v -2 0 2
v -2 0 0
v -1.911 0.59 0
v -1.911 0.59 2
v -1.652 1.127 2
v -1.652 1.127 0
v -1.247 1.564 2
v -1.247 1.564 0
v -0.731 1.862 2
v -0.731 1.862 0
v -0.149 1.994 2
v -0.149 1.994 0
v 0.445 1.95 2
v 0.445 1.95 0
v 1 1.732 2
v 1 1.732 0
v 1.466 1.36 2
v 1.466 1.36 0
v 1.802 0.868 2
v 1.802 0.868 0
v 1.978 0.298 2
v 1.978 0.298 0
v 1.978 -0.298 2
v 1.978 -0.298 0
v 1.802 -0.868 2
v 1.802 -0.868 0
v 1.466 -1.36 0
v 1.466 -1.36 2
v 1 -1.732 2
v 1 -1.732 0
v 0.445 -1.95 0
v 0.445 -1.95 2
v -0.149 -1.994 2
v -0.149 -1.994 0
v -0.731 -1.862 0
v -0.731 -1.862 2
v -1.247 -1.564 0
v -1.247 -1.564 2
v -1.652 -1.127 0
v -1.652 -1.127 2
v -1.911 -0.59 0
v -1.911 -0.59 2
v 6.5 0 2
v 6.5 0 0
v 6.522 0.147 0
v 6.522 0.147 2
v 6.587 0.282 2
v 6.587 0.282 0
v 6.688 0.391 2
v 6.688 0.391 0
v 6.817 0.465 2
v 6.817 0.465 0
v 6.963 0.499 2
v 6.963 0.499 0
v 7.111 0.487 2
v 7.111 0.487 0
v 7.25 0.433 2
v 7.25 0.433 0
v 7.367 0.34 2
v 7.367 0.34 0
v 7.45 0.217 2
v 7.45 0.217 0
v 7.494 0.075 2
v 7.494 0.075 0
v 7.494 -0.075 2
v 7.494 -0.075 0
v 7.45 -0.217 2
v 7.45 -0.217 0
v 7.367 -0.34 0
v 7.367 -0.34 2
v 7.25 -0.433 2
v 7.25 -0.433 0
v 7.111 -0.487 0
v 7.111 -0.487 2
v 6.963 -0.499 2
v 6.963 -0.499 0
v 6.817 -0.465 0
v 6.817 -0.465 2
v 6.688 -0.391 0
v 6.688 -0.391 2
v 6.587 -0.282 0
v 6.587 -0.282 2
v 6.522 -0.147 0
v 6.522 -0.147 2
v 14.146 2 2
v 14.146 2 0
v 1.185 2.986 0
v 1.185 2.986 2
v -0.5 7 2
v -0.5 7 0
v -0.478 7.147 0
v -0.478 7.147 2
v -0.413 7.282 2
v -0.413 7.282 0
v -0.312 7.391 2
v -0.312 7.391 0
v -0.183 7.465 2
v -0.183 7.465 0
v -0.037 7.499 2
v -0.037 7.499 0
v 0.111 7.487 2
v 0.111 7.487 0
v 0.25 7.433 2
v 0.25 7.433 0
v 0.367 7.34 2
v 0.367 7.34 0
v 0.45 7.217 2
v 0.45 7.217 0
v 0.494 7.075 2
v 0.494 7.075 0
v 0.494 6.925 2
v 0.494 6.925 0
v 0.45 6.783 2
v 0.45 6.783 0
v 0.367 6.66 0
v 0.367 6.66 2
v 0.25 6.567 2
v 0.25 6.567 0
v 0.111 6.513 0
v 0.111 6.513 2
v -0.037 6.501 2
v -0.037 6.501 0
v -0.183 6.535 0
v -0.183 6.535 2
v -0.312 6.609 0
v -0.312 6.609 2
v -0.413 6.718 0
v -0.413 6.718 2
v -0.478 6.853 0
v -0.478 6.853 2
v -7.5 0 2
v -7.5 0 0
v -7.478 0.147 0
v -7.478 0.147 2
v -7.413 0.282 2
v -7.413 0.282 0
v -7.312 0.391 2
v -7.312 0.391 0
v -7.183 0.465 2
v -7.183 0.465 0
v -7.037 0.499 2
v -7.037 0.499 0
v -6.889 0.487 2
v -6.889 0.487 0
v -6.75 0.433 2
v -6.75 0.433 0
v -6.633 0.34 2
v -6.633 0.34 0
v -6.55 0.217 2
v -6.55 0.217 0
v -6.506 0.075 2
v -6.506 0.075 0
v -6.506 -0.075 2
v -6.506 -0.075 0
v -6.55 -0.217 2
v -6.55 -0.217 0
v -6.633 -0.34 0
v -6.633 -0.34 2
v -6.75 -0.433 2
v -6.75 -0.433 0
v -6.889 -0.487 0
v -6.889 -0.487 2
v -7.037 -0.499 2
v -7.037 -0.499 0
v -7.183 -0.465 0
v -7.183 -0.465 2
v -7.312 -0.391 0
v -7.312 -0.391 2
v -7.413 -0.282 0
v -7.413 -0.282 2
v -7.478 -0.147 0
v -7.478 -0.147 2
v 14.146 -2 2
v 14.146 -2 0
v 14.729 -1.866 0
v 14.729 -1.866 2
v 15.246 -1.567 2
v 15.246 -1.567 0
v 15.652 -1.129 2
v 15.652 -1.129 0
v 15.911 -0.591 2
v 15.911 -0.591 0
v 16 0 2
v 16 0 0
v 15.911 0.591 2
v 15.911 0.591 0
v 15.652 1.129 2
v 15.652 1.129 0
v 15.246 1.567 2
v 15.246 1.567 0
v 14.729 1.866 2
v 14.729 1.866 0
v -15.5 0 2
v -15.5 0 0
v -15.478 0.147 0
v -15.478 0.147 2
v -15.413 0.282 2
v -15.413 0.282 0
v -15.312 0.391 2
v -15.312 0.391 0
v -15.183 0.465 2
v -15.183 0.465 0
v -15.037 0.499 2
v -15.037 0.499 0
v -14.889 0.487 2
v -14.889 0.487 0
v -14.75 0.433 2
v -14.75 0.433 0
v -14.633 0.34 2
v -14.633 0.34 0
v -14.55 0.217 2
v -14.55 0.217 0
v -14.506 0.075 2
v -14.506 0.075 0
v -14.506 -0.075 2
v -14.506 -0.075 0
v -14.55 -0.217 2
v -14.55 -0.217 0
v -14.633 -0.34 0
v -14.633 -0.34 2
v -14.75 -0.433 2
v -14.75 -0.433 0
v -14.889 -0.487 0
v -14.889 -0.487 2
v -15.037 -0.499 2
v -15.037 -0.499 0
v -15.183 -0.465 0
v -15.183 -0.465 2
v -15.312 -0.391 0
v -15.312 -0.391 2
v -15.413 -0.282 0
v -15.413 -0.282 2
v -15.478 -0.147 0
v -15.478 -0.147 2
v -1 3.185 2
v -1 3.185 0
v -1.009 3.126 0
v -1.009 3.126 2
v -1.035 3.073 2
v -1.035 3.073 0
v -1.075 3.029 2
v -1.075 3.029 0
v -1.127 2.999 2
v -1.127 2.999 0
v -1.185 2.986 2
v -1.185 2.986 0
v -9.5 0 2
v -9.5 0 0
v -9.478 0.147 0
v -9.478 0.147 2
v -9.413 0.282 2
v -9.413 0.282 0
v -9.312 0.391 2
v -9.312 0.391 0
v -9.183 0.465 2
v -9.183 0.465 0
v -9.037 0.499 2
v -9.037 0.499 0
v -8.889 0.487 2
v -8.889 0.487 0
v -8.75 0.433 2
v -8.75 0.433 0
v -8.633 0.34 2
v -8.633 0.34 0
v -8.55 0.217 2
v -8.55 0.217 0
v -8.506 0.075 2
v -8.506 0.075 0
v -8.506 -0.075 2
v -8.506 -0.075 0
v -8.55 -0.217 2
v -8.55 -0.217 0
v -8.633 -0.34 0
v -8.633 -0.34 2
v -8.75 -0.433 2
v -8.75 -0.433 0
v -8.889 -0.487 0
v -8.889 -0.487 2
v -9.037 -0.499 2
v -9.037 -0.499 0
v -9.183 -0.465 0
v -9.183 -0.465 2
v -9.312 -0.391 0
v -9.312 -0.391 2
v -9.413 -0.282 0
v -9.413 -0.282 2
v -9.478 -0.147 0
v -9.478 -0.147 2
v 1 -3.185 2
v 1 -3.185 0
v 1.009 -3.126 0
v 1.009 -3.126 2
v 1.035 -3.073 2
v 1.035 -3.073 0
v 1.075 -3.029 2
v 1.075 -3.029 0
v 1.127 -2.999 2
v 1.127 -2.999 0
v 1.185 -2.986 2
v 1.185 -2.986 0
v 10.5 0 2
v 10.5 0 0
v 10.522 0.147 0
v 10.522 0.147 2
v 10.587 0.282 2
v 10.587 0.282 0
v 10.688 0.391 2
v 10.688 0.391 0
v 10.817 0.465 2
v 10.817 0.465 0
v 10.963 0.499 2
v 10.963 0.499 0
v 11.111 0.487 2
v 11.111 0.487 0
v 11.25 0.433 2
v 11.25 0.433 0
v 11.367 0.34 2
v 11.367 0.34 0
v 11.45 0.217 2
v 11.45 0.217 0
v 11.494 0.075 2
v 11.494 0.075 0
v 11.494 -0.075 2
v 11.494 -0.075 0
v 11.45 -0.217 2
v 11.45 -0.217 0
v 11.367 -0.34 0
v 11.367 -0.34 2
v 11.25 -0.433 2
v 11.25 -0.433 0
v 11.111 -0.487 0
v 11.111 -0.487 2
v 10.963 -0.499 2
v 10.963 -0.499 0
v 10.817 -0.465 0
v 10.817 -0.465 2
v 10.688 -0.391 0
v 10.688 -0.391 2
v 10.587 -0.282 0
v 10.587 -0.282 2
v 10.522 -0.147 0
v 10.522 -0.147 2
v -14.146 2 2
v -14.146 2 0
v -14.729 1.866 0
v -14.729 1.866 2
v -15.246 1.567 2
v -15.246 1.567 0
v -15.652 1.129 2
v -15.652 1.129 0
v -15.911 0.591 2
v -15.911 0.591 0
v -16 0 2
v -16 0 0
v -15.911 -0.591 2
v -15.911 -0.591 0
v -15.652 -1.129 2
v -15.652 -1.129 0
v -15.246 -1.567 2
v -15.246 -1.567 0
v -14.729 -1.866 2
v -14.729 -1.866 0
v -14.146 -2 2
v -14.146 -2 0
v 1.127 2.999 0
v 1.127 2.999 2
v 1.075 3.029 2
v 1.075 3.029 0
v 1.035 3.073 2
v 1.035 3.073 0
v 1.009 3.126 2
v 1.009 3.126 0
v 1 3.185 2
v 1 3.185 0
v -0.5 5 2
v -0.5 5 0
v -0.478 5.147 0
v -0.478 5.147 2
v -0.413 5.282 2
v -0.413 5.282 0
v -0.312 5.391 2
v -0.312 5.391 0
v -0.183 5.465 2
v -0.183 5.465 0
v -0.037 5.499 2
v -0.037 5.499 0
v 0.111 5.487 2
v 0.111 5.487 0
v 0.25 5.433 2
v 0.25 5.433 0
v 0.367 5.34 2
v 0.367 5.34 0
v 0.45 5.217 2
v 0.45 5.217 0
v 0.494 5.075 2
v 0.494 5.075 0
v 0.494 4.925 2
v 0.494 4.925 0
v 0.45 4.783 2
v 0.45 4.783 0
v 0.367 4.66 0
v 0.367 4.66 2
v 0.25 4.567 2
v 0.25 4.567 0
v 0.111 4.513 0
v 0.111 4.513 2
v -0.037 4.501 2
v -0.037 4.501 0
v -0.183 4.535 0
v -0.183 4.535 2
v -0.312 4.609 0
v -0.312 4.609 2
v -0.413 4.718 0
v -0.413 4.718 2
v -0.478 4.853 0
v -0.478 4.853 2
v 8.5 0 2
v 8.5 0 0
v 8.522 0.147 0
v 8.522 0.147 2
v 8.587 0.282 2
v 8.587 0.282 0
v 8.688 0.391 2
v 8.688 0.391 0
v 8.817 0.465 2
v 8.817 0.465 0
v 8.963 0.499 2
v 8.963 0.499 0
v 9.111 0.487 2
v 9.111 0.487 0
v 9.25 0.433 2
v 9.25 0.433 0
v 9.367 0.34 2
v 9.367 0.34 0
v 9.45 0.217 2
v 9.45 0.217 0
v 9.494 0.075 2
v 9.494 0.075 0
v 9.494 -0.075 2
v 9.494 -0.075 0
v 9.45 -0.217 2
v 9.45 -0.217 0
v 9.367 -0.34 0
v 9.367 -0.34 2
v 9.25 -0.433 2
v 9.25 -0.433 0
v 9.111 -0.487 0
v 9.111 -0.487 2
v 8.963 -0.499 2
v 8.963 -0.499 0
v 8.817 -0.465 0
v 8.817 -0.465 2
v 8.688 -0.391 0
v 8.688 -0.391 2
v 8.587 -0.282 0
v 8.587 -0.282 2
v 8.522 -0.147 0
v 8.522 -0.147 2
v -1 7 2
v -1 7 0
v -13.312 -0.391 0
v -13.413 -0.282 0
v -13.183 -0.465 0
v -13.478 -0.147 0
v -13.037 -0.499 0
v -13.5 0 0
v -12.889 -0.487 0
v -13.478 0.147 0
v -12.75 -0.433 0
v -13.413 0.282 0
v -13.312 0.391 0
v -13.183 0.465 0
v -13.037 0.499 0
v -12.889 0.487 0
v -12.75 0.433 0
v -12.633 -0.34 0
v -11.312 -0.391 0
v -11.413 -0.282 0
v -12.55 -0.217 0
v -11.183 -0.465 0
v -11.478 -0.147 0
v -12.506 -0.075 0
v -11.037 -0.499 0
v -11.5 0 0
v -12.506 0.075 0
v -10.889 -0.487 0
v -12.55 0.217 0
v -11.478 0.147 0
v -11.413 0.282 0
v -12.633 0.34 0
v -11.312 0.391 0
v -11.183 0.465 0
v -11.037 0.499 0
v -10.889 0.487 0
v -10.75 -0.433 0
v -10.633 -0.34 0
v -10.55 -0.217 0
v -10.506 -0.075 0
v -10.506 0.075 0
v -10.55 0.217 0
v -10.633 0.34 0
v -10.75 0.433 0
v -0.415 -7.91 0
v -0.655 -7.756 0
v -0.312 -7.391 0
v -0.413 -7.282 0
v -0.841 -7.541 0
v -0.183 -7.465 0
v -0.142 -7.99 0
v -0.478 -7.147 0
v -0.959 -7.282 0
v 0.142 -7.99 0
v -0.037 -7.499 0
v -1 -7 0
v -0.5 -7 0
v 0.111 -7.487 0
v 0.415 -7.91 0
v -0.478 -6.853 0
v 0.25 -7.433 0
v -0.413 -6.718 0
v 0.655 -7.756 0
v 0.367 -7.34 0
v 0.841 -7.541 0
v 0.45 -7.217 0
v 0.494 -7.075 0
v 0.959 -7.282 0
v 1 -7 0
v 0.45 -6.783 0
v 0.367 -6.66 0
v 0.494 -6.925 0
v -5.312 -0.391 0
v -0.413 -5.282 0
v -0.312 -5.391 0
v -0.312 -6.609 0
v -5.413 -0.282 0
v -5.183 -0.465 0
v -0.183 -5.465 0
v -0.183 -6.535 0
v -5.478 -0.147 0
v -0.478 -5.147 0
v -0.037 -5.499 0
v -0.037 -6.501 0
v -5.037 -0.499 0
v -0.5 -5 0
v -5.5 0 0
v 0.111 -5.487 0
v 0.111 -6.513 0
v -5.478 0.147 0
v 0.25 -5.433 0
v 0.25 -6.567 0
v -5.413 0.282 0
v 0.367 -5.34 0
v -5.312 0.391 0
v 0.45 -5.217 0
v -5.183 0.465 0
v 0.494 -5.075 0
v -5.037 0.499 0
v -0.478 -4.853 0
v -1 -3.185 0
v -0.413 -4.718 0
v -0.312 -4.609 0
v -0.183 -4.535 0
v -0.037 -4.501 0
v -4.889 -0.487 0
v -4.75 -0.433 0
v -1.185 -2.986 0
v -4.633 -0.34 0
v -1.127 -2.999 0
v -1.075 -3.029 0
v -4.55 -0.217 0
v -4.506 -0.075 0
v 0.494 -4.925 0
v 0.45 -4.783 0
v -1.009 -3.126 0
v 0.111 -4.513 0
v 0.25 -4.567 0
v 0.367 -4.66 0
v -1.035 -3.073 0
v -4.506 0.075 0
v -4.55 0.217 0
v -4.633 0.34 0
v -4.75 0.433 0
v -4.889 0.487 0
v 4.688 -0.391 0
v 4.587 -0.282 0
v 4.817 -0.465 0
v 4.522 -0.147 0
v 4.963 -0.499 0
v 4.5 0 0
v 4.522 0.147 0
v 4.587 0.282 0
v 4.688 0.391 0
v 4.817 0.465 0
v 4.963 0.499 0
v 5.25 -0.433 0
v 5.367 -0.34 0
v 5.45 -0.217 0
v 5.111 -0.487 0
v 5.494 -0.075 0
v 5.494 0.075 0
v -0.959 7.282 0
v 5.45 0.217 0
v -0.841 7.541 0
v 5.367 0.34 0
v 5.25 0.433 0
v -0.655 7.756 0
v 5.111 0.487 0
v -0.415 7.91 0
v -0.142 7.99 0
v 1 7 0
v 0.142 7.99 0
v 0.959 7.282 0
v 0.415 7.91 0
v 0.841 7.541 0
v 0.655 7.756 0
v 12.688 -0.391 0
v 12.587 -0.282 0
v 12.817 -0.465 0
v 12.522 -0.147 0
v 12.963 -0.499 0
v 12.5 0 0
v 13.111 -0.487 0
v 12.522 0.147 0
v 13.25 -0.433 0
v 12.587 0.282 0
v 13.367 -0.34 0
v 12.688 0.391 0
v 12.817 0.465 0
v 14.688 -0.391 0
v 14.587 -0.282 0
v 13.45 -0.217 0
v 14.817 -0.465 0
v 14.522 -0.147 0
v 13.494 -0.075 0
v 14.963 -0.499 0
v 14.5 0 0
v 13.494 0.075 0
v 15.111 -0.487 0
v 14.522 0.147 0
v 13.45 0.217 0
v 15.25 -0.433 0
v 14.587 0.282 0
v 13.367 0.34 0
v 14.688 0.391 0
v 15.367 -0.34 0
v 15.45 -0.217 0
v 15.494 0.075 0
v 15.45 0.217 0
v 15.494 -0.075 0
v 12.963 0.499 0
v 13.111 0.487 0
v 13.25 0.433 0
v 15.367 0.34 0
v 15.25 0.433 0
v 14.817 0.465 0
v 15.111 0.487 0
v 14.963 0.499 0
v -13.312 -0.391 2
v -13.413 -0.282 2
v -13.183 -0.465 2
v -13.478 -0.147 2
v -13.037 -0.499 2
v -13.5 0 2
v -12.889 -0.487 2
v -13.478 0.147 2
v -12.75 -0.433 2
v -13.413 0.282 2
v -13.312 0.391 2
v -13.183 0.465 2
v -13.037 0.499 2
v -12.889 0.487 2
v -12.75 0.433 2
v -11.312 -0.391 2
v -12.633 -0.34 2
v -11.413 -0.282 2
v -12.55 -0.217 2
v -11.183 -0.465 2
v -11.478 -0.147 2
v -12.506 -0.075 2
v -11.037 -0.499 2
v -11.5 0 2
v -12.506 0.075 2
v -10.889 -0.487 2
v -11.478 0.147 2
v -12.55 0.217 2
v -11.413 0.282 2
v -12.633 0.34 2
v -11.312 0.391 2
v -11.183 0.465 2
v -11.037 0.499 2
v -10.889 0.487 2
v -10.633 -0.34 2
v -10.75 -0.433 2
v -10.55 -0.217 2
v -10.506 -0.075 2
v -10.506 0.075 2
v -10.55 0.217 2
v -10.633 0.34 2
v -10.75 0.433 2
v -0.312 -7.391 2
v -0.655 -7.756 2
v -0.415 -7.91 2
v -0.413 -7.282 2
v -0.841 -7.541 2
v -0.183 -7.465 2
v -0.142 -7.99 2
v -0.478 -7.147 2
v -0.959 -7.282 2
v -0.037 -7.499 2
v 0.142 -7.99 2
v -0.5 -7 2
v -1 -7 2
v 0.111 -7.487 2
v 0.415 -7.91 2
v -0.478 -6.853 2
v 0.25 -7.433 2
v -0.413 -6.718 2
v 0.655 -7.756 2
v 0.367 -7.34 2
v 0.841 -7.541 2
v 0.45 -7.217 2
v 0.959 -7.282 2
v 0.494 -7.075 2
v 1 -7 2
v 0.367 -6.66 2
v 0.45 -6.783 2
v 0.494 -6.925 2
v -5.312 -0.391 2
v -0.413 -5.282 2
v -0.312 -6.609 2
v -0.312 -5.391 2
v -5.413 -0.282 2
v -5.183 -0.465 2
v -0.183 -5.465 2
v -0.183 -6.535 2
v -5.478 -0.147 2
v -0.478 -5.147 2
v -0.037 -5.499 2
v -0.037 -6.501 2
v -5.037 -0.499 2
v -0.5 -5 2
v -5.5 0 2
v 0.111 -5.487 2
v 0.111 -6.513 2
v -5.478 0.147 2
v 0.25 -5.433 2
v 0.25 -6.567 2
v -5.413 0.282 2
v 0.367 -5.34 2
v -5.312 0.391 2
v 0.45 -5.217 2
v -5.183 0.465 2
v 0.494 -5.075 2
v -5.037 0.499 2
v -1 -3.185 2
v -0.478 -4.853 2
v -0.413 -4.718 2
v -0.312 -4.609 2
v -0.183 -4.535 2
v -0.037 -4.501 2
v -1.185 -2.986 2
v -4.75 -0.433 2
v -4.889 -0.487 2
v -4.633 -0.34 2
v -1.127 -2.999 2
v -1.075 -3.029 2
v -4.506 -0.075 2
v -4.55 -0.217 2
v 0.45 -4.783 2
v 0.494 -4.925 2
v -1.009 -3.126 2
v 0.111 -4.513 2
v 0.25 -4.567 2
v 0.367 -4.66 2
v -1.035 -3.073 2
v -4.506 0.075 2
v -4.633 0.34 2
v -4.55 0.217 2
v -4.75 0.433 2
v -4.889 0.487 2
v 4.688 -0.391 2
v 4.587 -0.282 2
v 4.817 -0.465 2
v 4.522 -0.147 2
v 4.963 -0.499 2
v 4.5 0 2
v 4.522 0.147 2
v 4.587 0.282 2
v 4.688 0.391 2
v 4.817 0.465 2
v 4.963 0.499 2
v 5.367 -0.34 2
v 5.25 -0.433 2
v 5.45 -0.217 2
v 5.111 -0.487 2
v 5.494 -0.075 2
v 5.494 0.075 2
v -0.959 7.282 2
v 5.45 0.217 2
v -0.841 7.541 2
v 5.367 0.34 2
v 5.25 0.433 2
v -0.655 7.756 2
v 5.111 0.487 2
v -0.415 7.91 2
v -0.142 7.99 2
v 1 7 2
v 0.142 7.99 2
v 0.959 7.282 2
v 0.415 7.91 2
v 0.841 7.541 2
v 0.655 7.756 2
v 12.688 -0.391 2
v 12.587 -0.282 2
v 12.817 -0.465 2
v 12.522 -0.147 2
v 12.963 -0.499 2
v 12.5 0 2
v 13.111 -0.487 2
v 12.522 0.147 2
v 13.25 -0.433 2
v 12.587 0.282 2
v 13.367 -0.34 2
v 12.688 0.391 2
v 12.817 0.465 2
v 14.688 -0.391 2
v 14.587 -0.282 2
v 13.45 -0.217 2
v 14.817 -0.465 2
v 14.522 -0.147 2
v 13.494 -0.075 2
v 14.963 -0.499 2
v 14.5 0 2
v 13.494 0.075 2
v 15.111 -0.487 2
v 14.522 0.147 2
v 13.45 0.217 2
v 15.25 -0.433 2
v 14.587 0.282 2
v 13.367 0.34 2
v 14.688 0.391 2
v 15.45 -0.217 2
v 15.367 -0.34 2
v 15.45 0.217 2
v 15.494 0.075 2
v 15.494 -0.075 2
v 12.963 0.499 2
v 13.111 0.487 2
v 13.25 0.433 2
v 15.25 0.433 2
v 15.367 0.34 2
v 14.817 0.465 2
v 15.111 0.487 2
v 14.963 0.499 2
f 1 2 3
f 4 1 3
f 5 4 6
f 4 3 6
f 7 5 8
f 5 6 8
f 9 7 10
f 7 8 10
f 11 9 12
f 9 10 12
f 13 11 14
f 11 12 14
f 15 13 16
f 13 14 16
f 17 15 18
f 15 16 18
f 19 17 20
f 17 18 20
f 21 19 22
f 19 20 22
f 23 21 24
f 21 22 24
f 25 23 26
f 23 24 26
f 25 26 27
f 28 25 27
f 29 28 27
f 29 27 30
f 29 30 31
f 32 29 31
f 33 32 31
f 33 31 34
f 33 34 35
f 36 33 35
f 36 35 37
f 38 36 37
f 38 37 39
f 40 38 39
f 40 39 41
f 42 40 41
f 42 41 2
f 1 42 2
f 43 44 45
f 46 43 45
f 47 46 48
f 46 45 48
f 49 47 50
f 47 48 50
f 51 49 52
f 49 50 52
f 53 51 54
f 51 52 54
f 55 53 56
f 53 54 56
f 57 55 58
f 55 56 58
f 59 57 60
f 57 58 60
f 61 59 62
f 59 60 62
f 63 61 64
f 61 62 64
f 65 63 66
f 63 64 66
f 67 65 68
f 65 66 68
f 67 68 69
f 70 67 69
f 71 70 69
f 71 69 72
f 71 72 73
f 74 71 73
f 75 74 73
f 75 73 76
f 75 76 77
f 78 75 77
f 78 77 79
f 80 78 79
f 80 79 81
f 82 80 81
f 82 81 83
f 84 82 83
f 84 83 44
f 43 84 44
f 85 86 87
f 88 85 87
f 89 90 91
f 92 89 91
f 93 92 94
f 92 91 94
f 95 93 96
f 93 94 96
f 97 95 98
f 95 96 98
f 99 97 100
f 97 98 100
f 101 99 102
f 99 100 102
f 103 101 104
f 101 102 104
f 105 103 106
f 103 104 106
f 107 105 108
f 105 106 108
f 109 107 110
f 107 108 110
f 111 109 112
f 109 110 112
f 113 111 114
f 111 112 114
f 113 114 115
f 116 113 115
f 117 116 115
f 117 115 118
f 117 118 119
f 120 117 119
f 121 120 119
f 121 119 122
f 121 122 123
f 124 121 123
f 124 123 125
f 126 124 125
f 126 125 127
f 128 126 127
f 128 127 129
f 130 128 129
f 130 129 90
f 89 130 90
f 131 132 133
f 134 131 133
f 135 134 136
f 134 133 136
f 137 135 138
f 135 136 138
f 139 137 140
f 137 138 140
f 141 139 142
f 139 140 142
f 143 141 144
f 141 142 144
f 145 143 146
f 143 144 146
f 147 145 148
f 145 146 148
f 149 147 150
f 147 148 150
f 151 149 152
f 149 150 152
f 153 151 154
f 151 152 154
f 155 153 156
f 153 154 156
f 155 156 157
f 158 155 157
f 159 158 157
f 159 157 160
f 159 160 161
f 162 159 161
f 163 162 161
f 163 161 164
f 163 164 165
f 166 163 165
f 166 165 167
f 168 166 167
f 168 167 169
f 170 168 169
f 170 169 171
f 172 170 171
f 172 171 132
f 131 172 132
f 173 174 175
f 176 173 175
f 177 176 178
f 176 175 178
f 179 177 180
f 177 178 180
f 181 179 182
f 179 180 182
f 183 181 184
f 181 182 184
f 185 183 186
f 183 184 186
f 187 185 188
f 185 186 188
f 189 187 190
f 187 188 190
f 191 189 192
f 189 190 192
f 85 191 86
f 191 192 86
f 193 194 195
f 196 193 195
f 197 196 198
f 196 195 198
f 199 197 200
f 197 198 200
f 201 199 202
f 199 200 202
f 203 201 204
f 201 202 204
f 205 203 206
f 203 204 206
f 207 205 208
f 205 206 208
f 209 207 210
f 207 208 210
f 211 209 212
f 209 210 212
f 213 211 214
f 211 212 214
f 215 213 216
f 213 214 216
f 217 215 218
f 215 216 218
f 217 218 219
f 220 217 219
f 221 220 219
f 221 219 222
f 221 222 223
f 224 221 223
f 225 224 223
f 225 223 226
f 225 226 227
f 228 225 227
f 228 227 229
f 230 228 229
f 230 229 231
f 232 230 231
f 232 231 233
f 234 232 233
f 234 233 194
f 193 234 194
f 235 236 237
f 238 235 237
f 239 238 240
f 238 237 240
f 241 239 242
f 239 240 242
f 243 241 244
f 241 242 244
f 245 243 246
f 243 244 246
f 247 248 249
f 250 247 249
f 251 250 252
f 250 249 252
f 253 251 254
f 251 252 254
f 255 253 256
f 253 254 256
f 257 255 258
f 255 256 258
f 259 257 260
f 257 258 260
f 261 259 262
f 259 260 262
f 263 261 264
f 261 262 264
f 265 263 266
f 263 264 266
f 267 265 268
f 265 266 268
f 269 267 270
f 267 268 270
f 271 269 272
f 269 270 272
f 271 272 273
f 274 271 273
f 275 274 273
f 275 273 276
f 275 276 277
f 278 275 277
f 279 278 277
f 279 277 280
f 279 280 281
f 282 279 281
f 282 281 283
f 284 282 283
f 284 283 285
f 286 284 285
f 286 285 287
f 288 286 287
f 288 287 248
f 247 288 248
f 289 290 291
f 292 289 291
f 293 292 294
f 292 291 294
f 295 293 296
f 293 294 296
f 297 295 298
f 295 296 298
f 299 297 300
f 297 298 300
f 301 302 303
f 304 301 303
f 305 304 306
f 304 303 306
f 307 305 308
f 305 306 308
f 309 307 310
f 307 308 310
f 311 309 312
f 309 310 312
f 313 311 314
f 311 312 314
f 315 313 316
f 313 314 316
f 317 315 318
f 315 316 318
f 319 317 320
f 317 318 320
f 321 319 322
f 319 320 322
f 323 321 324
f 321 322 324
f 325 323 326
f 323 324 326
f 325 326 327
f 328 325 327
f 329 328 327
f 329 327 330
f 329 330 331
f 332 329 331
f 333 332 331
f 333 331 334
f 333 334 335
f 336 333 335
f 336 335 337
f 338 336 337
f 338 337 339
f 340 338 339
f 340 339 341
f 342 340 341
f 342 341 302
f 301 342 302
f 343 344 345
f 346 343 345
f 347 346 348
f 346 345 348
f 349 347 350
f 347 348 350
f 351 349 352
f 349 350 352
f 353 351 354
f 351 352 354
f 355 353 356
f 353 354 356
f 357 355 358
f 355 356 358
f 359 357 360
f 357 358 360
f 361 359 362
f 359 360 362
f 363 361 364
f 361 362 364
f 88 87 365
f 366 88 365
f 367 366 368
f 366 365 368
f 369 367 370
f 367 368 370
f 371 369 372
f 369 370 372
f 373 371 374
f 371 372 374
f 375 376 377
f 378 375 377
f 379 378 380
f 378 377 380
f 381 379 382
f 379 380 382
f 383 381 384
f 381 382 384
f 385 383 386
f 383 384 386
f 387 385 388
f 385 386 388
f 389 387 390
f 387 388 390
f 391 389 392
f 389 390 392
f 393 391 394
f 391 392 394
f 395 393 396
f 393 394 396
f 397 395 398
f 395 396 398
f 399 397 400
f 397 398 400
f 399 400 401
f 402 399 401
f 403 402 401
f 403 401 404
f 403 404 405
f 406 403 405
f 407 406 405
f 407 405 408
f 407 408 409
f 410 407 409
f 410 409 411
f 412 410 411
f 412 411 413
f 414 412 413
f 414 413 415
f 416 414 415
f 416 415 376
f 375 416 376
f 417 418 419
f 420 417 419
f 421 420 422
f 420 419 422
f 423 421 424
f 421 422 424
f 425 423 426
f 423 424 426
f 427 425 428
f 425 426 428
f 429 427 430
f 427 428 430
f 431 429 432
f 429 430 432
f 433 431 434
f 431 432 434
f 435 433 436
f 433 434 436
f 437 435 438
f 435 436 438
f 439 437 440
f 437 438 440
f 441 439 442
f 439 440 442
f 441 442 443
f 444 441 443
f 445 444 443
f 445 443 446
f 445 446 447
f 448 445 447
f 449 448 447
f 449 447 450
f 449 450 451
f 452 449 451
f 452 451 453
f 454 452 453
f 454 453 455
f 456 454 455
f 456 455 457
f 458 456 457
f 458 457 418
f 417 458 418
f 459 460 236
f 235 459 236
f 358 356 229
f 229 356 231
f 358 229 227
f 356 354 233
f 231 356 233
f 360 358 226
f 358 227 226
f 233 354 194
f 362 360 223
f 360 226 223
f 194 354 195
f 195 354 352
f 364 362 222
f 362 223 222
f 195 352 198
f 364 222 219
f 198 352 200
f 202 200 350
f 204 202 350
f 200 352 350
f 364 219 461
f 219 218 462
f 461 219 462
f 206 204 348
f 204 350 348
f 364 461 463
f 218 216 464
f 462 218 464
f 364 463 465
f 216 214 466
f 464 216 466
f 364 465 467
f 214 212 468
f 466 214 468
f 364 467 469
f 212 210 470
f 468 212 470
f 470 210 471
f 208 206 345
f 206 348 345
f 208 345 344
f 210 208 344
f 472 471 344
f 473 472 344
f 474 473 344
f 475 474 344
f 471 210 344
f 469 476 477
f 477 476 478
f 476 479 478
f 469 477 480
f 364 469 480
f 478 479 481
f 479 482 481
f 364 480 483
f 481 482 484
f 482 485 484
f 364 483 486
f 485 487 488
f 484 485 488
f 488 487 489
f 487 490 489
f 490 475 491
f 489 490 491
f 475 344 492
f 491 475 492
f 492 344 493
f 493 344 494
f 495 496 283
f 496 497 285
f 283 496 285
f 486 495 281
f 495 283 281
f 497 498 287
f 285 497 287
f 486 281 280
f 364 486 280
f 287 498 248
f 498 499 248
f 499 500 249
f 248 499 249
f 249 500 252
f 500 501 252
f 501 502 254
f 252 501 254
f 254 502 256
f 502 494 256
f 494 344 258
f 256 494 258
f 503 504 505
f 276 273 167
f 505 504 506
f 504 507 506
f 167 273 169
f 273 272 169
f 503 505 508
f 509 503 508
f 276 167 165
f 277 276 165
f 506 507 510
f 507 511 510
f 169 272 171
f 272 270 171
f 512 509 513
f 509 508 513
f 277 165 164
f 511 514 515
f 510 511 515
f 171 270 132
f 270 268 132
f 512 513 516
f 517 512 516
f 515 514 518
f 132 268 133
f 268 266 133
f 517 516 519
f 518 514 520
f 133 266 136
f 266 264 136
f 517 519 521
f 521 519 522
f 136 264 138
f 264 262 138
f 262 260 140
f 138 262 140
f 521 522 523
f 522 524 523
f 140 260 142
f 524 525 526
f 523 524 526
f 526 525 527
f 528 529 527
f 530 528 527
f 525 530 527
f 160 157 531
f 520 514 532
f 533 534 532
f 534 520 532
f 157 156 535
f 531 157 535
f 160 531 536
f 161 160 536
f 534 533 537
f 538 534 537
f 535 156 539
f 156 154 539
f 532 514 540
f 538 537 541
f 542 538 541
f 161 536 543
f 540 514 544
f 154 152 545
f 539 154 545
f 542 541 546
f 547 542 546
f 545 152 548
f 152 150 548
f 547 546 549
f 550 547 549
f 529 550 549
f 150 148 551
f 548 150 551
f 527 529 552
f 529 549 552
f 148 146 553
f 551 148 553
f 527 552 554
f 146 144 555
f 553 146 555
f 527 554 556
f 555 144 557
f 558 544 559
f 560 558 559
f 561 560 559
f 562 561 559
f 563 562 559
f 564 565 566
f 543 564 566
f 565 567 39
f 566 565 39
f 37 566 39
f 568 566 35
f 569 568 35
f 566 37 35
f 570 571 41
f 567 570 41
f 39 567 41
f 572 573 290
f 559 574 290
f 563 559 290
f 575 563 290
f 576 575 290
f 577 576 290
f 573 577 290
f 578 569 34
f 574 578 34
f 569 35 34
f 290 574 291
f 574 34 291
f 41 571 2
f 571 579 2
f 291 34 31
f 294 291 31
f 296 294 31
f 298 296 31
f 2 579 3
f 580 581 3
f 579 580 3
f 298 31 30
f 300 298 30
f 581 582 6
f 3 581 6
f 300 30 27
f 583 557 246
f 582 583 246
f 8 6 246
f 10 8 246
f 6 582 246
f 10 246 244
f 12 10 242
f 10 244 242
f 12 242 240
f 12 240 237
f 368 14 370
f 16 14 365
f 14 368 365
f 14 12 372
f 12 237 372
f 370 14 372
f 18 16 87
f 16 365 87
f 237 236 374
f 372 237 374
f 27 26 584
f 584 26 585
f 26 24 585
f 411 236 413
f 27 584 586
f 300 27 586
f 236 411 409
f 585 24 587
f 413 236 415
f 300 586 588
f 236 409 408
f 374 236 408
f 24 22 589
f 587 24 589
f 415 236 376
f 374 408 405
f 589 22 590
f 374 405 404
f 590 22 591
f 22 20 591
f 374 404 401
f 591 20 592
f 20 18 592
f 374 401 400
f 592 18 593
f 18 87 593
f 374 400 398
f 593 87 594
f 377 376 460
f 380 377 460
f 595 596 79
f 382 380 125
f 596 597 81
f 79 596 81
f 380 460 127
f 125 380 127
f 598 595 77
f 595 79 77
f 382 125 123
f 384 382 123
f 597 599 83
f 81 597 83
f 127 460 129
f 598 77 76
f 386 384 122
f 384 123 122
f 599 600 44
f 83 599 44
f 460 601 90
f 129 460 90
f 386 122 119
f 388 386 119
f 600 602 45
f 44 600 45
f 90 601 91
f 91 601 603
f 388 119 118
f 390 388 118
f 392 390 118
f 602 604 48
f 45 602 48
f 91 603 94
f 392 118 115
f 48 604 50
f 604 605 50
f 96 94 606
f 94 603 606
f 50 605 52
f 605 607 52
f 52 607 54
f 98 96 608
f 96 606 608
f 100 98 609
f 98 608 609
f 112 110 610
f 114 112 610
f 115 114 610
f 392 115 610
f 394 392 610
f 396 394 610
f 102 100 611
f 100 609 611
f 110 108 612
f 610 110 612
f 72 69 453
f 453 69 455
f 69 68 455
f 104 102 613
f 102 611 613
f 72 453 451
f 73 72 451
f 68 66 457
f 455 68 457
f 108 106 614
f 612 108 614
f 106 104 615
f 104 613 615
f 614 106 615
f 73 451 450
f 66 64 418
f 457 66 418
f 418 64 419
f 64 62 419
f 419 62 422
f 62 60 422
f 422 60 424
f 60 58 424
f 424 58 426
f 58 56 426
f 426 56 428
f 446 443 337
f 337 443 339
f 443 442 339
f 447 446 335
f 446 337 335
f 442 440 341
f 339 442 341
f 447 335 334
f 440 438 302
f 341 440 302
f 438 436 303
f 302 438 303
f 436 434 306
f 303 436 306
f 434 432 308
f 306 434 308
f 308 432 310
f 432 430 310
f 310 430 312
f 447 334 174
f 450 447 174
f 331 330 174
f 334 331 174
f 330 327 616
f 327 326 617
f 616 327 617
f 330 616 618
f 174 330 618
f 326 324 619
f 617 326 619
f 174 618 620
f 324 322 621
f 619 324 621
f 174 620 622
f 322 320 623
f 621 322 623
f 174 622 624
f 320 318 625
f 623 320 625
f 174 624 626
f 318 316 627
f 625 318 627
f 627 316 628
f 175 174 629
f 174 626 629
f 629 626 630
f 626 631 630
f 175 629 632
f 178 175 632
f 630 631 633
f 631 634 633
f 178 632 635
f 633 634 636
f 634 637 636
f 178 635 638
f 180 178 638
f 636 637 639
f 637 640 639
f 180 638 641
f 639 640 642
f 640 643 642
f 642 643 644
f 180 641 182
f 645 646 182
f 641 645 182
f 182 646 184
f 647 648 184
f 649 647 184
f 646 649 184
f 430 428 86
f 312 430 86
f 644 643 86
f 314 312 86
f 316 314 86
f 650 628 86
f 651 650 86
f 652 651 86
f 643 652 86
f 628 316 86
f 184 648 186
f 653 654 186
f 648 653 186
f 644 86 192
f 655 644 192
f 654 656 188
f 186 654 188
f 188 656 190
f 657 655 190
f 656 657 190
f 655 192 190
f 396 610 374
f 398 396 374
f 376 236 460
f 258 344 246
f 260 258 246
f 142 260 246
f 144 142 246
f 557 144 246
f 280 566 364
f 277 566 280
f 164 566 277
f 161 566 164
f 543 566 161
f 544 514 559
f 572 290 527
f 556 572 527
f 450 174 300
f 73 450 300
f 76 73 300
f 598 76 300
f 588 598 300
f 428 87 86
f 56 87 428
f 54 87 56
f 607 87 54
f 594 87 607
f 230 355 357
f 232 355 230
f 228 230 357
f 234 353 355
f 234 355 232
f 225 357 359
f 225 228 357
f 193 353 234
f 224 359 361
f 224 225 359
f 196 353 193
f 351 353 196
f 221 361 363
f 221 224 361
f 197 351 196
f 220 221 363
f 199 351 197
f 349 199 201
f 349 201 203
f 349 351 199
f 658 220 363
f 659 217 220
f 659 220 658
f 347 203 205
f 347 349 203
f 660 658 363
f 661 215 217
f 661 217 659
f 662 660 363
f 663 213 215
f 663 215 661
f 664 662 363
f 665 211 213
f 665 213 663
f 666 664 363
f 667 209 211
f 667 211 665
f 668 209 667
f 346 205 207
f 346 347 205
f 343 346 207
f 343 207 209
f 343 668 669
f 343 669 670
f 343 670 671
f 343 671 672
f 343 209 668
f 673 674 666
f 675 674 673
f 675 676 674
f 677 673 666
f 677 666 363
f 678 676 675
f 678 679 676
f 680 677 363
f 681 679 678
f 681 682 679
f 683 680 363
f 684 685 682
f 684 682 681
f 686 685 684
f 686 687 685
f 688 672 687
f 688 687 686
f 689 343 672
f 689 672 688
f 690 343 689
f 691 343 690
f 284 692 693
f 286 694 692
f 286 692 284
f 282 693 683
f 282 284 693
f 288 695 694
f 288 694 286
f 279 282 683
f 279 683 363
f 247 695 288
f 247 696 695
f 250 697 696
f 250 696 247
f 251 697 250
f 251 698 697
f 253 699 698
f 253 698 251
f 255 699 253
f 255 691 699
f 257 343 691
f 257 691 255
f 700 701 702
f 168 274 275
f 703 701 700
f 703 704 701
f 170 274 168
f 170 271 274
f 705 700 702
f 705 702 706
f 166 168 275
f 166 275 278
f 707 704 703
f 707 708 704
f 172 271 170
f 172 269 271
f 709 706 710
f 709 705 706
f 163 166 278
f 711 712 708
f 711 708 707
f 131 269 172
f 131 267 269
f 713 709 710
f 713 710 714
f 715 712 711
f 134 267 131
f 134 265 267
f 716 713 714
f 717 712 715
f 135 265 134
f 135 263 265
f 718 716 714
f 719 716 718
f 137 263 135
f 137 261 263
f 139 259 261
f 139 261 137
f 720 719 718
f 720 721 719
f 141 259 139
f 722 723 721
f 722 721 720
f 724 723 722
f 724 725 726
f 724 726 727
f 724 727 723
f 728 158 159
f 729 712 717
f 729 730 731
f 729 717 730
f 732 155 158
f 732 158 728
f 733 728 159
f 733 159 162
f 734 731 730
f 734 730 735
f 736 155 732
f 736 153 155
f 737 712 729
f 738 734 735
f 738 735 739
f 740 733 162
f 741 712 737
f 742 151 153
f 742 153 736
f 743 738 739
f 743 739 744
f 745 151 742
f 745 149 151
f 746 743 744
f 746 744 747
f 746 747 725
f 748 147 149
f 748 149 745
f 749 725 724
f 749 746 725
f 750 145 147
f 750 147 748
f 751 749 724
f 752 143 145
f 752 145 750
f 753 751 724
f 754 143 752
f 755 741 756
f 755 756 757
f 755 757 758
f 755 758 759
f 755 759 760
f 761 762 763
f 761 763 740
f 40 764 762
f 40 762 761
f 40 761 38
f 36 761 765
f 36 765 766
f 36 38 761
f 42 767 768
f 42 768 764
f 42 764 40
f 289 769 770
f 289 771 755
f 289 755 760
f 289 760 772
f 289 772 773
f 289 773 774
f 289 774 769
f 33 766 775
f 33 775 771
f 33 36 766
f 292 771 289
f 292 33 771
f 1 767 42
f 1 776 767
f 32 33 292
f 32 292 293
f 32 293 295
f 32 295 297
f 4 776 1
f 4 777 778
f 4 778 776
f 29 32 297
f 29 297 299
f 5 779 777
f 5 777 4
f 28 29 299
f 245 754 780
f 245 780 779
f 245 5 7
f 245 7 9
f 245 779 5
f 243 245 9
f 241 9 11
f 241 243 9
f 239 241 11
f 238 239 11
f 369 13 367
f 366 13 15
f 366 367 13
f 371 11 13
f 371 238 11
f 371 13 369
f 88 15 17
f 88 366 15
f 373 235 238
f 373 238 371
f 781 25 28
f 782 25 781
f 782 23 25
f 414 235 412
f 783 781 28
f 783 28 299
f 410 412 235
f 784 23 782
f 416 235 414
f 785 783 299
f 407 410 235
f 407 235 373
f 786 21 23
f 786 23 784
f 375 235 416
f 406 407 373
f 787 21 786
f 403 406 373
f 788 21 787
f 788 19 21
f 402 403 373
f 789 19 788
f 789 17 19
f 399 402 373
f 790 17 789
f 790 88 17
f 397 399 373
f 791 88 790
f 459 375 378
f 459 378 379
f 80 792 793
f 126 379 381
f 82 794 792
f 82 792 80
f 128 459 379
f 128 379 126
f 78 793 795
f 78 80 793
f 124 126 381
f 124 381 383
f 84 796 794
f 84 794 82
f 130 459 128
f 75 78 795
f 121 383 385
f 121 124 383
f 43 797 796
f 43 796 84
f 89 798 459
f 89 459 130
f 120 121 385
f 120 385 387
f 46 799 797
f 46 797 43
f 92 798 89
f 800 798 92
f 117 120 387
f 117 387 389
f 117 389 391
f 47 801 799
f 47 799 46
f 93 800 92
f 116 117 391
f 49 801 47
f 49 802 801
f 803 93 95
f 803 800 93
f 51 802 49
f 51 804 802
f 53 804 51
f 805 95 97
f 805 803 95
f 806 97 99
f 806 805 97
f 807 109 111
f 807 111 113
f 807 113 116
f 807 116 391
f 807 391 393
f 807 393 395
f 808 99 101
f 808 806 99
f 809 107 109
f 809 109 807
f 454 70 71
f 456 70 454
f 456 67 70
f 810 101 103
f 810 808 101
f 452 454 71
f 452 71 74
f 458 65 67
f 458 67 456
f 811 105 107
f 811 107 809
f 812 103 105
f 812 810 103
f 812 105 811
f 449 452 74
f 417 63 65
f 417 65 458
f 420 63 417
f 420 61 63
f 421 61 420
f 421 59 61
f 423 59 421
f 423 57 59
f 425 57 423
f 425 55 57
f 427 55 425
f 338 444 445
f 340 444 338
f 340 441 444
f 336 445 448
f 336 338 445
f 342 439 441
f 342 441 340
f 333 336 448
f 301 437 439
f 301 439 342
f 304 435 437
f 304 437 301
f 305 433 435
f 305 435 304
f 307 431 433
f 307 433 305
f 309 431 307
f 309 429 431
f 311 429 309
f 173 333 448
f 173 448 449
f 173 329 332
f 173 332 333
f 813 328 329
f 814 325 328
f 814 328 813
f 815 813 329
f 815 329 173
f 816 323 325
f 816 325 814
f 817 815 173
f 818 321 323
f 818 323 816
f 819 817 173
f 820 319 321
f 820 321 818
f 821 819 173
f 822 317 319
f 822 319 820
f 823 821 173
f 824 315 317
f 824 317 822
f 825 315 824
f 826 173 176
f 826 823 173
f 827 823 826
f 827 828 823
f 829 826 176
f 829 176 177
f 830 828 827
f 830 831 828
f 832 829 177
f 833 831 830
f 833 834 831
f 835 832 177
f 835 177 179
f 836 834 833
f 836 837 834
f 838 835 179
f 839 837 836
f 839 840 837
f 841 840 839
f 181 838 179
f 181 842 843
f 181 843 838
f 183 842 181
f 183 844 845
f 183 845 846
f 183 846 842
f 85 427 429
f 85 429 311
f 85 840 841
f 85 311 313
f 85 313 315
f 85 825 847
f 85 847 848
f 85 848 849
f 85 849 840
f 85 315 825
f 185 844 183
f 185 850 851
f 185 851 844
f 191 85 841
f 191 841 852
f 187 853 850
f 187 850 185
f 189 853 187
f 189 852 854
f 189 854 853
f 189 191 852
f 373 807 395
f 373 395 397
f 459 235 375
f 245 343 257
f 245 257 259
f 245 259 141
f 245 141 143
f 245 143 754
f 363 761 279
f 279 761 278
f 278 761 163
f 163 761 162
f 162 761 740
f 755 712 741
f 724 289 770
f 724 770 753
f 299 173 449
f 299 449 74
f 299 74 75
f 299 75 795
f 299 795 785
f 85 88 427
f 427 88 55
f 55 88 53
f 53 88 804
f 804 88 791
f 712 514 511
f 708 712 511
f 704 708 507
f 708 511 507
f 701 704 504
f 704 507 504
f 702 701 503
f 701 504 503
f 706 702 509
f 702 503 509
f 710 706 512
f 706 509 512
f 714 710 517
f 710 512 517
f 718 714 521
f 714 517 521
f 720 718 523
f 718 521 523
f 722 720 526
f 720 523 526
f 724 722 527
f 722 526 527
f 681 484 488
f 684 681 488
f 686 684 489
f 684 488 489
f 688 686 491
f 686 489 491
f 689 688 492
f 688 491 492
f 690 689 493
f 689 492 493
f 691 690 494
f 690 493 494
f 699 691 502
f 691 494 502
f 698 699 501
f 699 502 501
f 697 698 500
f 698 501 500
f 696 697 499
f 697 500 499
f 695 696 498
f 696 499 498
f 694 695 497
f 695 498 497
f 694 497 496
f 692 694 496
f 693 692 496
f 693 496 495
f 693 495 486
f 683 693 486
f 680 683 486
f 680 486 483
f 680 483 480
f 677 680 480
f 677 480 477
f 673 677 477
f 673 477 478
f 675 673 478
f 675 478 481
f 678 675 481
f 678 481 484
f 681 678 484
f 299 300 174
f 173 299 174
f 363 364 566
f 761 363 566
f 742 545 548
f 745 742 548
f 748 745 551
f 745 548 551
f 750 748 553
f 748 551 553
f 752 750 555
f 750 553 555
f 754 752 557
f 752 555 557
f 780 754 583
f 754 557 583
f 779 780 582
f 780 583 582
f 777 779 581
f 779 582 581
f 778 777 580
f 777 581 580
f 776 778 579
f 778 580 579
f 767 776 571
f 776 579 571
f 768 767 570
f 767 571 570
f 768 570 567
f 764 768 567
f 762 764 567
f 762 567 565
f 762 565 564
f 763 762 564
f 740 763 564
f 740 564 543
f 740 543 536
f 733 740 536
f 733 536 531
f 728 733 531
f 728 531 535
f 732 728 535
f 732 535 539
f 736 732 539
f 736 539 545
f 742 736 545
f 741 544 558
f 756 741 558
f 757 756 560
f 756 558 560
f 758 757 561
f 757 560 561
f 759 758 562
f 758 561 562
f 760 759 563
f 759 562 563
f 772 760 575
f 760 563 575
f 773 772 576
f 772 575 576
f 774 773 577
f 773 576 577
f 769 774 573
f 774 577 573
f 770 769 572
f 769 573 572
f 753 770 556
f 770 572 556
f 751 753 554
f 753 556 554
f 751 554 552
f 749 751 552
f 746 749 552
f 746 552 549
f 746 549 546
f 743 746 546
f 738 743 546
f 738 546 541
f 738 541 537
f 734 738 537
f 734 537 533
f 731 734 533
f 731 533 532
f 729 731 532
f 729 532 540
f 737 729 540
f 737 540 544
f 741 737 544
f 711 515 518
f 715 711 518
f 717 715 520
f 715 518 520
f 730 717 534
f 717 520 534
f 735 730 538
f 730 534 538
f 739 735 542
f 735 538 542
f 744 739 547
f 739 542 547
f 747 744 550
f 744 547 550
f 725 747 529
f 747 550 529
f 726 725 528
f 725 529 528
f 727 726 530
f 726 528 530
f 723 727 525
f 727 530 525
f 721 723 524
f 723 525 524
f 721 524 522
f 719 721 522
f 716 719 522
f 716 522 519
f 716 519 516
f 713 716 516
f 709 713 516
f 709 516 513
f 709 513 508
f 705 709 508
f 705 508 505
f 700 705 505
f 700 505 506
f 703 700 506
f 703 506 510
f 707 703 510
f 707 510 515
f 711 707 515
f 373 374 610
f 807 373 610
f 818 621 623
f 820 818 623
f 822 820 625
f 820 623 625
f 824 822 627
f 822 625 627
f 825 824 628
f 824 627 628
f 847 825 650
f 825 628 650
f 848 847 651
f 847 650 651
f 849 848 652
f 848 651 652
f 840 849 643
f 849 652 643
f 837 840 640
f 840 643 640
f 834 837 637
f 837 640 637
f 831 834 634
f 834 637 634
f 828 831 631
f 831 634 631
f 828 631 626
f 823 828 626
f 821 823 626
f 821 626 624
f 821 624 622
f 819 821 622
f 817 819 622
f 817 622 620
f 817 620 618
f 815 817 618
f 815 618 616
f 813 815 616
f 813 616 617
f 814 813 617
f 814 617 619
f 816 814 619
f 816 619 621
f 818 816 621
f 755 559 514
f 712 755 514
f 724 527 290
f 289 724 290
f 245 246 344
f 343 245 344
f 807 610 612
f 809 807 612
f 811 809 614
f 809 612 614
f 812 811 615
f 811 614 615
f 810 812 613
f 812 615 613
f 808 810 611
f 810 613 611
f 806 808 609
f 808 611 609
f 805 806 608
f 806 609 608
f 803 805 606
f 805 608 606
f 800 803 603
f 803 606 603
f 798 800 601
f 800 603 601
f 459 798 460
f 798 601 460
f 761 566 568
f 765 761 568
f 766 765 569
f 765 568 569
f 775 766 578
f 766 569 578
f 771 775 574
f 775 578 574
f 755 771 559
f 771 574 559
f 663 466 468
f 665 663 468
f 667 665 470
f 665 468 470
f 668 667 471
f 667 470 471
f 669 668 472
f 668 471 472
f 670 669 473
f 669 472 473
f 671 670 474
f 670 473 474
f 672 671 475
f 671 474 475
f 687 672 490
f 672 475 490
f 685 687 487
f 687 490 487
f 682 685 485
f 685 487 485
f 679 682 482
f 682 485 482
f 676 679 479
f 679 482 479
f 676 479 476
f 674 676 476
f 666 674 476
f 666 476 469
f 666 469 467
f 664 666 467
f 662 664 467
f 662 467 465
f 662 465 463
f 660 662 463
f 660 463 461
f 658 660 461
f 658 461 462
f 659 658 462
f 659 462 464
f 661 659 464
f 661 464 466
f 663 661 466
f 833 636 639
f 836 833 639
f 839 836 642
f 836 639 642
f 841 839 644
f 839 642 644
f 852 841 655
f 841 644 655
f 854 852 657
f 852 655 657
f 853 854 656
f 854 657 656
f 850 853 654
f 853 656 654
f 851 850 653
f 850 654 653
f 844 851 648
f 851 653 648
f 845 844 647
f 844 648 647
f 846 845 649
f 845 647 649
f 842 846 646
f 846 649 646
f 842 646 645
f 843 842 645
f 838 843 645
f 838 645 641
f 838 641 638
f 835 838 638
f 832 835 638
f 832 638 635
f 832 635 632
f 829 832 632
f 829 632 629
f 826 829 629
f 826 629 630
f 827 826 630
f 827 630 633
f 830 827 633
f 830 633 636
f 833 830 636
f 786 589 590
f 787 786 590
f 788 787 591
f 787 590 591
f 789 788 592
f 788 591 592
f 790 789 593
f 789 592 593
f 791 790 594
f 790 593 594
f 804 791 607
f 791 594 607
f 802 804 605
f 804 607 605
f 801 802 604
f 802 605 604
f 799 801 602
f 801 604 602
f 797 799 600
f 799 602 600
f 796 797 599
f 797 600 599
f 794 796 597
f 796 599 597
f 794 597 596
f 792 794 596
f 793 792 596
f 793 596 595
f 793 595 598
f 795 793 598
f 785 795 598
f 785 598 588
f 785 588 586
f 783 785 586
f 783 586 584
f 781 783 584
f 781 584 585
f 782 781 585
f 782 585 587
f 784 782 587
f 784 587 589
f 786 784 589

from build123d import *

# Parameters (mm, degrees)
F1_DEPTH = 2
F3_D     = 1
F5_D     = 4


with BuildPart() as f1:
    # F0 (on Top) → F1 (new body)
    with BuildSketch(Plane.XY):
        with BuildLine():
            Line((1, 3.185364), (1, 7))
            ThreePointArc((1, 7), (0, 8), (-1, 7))
            Line((-1, 7), (-1, 3.185364))
            ThreePointArc((-1, 3.185364), (-1.053313, 3.049412), (-1.18483, 2.985941))
            Line((-1.18483, 2.985941), (-14.146356, 2))
            ThreePointArc((-14.146356, 2), (-16, 0), (-14.146356, -2))
            Line((-14.146356, -2), (-1.18483, -2.985941))
            ThreePointArc((-1.18483, -2.985941), (-1.053313, -3.049412), (-1, -3.185364))
            Line((-1, -3.185364), (-1, -7))
            ThreePointArc((-1, -7), (0, -8), (1, -7))
            Line((1, -7), (1, -3.185364))
            ThreePointArc((1, -3.185364), (1.053313, -3.049412), (1.18483, -2.985941))
            Line((1.18483, -2.985941), (14.146356, -2))
            ThreePointArc((14.146356, -2), (16, 0), (14.146356, 2))
            Line((14.146356, 2), (1.18483, 2.985941))
            ThreePointArc((1.18483, 2.985941), (1.053313, 3.049412), (1, 3.185364))
        make_face()
    extrude(amount=F1_DEPTH)

    # F3 (through all)
    with Locations(Plane.XY.offset(2)):
        with Locations((5, 0), (7, 0), (9, 0), (11, 0), (13, 0), (15, 0), (0, 5), (0, 7), (-5, 0), (-7, 0), (-9, 0), (-11, 0), (-13, 0), (-15, 0), (0, -5), (0, -7)):
            Hole(F3_D / 2)

    # F5 (through all)
    with Locations(Plane.XY.offset(2)):
        with Locations((0, 0)):
            Hole(F5_D / 2)


solid = f1.part
